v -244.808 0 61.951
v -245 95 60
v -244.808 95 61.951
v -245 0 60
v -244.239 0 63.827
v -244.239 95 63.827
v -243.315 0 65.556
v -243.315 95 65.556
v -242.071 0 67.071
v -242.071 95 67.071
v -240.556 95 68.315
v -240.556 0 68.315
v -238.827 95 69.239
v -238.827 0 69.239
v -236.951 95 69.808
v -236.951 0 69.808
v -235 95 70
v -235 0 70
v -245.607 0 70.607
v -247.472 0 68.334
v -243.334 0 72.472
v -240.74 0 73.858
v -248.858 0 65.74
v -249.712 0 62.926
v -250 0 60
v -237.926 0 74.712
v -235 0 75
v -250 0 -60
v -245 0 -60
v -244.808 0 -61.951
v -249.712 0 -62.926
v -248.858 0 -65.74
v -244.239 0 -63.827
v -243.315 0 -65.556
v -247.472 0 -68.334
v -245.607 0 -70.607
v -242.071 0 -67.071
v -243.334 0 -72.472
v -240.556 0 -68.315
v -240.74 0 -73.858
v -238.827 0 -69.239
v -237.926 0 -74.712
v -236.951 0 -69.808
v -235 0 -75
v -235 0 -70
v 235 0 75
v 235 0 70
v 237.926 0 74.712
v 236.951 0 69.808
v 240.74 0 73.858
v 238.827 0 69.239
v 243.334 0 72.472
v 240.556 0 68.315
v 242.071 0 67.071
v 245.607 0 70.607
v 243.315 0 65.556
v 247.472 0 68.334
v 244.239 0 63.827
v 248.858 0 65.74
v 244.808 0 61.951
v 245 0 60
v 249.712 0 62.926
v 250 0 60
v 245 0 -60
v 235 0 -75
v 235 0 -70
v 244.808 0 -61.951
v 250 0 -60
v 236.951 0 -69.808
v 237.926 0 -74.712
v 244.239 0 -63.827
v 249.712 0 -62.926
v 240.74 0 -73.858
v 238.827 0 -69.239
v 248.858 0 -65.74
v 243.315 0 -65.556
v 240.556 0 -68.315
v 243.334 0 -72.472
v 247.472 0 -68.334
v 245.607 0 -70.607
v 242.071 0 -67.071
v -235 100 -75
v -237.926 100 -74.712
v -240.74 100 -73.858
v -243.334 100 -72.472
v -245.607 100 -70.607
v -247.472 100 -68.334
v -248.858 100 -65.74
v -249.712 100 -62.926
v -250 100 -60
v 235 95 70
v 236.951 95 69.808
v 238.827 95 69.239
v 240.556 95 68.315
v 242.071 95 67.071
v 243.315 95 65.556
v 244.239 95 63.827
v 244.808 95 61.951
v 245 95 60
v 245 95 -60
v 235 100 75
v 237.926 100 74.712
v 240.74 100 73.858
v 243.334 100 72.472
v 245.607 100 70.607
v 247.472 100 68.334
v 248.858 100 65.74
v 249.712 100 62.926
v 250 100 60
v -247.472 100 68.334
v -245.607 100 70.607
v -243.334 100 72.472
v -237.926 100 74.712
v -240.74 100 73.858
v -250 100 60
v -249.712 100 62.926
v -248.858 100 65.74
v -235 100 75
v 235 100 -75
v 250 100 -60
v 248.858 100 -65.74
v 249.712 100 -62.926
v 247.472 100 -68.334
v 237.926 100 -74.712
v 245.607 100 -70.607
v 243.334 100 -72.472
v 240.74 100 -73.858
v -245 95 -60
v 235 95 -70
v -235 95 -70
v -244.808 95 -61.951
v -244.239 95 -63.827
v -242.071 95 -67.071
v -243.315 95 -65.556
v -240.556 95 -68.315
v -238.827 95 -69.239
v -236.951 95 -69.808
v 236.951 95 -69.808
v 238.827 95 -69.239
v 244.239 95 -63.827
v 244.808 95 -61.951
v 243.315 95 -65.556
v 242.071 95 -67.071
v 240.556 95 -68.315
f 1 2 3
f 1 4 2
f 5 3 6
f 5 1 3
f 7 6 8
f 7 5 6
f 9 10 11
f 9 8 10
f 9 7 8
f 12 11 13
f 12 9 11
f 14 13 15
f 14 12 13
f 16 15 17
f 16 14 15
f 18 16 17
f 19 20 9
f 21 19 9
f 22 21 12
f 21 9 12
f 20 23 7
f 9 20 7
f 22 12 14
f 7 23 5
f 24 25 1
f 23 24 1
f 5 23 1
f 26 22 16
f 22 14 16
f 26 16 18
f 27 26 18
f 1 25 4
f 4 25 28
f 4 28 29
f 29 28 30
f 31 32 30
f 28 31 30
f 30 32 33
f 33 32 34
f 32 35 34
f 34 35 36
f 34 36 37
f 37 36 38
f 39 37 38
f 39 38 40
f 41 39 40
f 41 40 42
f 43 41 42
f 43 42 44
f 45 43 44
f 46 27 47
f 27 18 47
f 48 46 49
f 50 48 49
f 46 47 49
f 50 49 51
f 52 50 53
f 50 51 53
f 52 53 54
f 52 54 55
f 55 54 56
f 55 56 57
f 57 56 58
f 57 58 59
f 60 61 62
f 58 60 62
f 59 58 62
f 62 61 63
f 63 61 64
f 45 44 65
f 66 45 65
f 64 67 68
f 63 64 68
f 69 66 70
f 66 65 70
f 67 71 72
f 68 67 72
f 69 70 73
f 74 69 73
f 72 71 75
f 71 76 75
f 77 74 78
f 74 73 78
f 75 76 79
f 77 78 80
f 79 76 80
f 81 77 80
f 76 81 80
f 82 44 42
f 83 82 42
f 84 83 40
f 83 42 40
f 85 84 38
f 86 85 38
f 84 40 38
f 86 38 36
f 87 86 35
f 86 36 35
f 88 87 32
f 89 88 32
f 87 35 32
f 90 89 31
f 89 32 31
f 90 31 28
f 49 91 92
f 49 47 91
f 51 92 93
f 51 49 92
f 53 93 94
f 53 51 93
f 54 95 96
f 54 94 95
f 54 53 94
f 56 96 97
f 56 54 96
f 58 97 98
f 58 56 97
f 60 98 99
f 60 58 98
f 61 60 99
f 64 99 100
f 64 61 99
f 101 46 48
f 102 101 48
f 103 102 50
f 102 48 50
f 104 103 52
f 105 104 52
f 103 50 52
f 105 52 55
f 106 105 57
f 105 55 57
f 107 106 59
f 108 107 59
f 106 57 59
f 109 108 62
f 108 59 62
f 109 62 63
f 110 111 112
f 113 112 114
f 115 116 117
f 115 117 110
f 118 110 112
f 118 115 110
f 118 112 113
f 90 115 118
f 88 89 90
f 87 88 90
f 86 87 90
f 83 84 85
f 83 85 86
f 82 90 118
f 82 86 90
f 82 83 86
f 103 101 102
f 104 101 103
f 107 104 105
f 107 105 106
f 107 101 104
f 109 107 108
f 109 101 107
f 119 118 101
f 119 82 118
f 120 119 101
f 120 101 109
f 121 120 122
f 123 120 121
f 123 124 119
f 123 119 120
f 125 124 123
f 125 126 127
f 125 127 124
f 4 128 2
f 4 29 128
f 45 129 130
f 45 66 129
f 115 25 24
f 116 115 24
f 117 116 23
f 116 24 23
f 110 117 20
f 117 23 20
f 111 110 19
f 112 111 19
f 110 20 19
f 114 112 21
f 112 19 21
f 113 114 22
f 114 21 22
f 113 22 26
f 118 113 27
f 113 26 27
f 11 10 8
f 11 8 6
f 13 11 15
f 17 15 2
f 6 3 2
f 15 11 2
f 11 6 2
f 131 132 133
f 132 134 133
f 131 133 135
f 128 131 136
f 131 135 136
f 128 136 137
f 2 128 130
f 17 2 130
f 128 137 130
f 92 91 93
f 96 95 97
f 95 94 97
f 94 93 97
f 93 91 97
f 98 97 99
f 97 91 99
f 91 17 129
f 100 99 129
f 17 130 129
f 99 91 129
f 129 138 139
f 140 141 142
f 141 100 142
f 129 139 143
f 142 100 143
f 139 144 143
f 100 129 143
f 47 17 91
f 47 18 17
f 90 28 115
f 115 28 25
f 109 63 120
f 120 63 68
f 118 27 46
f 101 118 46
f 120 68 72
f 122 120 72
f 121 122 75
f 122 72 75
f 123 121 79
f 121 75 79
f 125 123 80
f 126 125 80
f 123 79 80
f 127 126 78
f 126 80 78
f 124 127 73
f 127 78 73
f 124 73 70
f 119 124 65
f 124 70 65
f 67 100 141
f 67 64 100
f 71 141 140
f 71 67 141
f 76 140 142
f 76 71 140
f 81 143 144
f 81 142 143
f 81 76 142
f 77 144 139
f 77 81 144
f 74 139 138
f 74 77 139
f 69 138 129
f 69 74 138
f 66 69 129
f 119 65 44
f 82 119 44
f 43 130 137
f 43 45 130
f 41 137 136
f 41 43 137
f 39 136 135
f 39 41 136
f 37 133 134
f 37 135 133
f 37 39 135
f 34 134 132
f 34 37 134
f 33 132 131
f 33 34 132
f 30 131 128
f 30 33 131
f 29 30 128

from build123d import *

# Parameters (mm, degrees)
BOSS_EXTRUDE1_DEPTH = 100
SHELL1_T            = -5


with BuildPart() as part:
    # Sketch1 → Boss-Extrude1 (new body)
    with BuildSketch(Plane(origin=(0, 0, 0), x_dir=(1, 0, 0), z_dir=(0, 1, 0))):
        with BuildLine():
            Line((-235, -75), (235, -75))
            ThreePointArc((235, -75), (245.606601718, -70.606601718), (250, -60))
            Line((250, -60), (250, 60))
            ThreePointArc((250, 60), (245.606601718, 70.606601718), (235, 75))
            Line((235, 75), (-235, 75))
            ThreePointArc((-235, 75), (-245.606601718, 70.606601718), (-250, 60))
            Line((-250, 60), (-250, -60))
            ThreePointArc((-250, -60), (-245.606601718, -70.606601718), (-235, -75))
        make_face()
    extrude(amount=BOSS_EXTRUDE1_DEPTH)

    # Shell1
    shell1_openings = [part.faces().sort_by_distance(p)[0] for p in [
        (0, 0, 0),
    ]]
    offset(amount=SHELL1_T, openings=shell1_openings, kind=Kind.INTERSECTION)


solid = part.part
